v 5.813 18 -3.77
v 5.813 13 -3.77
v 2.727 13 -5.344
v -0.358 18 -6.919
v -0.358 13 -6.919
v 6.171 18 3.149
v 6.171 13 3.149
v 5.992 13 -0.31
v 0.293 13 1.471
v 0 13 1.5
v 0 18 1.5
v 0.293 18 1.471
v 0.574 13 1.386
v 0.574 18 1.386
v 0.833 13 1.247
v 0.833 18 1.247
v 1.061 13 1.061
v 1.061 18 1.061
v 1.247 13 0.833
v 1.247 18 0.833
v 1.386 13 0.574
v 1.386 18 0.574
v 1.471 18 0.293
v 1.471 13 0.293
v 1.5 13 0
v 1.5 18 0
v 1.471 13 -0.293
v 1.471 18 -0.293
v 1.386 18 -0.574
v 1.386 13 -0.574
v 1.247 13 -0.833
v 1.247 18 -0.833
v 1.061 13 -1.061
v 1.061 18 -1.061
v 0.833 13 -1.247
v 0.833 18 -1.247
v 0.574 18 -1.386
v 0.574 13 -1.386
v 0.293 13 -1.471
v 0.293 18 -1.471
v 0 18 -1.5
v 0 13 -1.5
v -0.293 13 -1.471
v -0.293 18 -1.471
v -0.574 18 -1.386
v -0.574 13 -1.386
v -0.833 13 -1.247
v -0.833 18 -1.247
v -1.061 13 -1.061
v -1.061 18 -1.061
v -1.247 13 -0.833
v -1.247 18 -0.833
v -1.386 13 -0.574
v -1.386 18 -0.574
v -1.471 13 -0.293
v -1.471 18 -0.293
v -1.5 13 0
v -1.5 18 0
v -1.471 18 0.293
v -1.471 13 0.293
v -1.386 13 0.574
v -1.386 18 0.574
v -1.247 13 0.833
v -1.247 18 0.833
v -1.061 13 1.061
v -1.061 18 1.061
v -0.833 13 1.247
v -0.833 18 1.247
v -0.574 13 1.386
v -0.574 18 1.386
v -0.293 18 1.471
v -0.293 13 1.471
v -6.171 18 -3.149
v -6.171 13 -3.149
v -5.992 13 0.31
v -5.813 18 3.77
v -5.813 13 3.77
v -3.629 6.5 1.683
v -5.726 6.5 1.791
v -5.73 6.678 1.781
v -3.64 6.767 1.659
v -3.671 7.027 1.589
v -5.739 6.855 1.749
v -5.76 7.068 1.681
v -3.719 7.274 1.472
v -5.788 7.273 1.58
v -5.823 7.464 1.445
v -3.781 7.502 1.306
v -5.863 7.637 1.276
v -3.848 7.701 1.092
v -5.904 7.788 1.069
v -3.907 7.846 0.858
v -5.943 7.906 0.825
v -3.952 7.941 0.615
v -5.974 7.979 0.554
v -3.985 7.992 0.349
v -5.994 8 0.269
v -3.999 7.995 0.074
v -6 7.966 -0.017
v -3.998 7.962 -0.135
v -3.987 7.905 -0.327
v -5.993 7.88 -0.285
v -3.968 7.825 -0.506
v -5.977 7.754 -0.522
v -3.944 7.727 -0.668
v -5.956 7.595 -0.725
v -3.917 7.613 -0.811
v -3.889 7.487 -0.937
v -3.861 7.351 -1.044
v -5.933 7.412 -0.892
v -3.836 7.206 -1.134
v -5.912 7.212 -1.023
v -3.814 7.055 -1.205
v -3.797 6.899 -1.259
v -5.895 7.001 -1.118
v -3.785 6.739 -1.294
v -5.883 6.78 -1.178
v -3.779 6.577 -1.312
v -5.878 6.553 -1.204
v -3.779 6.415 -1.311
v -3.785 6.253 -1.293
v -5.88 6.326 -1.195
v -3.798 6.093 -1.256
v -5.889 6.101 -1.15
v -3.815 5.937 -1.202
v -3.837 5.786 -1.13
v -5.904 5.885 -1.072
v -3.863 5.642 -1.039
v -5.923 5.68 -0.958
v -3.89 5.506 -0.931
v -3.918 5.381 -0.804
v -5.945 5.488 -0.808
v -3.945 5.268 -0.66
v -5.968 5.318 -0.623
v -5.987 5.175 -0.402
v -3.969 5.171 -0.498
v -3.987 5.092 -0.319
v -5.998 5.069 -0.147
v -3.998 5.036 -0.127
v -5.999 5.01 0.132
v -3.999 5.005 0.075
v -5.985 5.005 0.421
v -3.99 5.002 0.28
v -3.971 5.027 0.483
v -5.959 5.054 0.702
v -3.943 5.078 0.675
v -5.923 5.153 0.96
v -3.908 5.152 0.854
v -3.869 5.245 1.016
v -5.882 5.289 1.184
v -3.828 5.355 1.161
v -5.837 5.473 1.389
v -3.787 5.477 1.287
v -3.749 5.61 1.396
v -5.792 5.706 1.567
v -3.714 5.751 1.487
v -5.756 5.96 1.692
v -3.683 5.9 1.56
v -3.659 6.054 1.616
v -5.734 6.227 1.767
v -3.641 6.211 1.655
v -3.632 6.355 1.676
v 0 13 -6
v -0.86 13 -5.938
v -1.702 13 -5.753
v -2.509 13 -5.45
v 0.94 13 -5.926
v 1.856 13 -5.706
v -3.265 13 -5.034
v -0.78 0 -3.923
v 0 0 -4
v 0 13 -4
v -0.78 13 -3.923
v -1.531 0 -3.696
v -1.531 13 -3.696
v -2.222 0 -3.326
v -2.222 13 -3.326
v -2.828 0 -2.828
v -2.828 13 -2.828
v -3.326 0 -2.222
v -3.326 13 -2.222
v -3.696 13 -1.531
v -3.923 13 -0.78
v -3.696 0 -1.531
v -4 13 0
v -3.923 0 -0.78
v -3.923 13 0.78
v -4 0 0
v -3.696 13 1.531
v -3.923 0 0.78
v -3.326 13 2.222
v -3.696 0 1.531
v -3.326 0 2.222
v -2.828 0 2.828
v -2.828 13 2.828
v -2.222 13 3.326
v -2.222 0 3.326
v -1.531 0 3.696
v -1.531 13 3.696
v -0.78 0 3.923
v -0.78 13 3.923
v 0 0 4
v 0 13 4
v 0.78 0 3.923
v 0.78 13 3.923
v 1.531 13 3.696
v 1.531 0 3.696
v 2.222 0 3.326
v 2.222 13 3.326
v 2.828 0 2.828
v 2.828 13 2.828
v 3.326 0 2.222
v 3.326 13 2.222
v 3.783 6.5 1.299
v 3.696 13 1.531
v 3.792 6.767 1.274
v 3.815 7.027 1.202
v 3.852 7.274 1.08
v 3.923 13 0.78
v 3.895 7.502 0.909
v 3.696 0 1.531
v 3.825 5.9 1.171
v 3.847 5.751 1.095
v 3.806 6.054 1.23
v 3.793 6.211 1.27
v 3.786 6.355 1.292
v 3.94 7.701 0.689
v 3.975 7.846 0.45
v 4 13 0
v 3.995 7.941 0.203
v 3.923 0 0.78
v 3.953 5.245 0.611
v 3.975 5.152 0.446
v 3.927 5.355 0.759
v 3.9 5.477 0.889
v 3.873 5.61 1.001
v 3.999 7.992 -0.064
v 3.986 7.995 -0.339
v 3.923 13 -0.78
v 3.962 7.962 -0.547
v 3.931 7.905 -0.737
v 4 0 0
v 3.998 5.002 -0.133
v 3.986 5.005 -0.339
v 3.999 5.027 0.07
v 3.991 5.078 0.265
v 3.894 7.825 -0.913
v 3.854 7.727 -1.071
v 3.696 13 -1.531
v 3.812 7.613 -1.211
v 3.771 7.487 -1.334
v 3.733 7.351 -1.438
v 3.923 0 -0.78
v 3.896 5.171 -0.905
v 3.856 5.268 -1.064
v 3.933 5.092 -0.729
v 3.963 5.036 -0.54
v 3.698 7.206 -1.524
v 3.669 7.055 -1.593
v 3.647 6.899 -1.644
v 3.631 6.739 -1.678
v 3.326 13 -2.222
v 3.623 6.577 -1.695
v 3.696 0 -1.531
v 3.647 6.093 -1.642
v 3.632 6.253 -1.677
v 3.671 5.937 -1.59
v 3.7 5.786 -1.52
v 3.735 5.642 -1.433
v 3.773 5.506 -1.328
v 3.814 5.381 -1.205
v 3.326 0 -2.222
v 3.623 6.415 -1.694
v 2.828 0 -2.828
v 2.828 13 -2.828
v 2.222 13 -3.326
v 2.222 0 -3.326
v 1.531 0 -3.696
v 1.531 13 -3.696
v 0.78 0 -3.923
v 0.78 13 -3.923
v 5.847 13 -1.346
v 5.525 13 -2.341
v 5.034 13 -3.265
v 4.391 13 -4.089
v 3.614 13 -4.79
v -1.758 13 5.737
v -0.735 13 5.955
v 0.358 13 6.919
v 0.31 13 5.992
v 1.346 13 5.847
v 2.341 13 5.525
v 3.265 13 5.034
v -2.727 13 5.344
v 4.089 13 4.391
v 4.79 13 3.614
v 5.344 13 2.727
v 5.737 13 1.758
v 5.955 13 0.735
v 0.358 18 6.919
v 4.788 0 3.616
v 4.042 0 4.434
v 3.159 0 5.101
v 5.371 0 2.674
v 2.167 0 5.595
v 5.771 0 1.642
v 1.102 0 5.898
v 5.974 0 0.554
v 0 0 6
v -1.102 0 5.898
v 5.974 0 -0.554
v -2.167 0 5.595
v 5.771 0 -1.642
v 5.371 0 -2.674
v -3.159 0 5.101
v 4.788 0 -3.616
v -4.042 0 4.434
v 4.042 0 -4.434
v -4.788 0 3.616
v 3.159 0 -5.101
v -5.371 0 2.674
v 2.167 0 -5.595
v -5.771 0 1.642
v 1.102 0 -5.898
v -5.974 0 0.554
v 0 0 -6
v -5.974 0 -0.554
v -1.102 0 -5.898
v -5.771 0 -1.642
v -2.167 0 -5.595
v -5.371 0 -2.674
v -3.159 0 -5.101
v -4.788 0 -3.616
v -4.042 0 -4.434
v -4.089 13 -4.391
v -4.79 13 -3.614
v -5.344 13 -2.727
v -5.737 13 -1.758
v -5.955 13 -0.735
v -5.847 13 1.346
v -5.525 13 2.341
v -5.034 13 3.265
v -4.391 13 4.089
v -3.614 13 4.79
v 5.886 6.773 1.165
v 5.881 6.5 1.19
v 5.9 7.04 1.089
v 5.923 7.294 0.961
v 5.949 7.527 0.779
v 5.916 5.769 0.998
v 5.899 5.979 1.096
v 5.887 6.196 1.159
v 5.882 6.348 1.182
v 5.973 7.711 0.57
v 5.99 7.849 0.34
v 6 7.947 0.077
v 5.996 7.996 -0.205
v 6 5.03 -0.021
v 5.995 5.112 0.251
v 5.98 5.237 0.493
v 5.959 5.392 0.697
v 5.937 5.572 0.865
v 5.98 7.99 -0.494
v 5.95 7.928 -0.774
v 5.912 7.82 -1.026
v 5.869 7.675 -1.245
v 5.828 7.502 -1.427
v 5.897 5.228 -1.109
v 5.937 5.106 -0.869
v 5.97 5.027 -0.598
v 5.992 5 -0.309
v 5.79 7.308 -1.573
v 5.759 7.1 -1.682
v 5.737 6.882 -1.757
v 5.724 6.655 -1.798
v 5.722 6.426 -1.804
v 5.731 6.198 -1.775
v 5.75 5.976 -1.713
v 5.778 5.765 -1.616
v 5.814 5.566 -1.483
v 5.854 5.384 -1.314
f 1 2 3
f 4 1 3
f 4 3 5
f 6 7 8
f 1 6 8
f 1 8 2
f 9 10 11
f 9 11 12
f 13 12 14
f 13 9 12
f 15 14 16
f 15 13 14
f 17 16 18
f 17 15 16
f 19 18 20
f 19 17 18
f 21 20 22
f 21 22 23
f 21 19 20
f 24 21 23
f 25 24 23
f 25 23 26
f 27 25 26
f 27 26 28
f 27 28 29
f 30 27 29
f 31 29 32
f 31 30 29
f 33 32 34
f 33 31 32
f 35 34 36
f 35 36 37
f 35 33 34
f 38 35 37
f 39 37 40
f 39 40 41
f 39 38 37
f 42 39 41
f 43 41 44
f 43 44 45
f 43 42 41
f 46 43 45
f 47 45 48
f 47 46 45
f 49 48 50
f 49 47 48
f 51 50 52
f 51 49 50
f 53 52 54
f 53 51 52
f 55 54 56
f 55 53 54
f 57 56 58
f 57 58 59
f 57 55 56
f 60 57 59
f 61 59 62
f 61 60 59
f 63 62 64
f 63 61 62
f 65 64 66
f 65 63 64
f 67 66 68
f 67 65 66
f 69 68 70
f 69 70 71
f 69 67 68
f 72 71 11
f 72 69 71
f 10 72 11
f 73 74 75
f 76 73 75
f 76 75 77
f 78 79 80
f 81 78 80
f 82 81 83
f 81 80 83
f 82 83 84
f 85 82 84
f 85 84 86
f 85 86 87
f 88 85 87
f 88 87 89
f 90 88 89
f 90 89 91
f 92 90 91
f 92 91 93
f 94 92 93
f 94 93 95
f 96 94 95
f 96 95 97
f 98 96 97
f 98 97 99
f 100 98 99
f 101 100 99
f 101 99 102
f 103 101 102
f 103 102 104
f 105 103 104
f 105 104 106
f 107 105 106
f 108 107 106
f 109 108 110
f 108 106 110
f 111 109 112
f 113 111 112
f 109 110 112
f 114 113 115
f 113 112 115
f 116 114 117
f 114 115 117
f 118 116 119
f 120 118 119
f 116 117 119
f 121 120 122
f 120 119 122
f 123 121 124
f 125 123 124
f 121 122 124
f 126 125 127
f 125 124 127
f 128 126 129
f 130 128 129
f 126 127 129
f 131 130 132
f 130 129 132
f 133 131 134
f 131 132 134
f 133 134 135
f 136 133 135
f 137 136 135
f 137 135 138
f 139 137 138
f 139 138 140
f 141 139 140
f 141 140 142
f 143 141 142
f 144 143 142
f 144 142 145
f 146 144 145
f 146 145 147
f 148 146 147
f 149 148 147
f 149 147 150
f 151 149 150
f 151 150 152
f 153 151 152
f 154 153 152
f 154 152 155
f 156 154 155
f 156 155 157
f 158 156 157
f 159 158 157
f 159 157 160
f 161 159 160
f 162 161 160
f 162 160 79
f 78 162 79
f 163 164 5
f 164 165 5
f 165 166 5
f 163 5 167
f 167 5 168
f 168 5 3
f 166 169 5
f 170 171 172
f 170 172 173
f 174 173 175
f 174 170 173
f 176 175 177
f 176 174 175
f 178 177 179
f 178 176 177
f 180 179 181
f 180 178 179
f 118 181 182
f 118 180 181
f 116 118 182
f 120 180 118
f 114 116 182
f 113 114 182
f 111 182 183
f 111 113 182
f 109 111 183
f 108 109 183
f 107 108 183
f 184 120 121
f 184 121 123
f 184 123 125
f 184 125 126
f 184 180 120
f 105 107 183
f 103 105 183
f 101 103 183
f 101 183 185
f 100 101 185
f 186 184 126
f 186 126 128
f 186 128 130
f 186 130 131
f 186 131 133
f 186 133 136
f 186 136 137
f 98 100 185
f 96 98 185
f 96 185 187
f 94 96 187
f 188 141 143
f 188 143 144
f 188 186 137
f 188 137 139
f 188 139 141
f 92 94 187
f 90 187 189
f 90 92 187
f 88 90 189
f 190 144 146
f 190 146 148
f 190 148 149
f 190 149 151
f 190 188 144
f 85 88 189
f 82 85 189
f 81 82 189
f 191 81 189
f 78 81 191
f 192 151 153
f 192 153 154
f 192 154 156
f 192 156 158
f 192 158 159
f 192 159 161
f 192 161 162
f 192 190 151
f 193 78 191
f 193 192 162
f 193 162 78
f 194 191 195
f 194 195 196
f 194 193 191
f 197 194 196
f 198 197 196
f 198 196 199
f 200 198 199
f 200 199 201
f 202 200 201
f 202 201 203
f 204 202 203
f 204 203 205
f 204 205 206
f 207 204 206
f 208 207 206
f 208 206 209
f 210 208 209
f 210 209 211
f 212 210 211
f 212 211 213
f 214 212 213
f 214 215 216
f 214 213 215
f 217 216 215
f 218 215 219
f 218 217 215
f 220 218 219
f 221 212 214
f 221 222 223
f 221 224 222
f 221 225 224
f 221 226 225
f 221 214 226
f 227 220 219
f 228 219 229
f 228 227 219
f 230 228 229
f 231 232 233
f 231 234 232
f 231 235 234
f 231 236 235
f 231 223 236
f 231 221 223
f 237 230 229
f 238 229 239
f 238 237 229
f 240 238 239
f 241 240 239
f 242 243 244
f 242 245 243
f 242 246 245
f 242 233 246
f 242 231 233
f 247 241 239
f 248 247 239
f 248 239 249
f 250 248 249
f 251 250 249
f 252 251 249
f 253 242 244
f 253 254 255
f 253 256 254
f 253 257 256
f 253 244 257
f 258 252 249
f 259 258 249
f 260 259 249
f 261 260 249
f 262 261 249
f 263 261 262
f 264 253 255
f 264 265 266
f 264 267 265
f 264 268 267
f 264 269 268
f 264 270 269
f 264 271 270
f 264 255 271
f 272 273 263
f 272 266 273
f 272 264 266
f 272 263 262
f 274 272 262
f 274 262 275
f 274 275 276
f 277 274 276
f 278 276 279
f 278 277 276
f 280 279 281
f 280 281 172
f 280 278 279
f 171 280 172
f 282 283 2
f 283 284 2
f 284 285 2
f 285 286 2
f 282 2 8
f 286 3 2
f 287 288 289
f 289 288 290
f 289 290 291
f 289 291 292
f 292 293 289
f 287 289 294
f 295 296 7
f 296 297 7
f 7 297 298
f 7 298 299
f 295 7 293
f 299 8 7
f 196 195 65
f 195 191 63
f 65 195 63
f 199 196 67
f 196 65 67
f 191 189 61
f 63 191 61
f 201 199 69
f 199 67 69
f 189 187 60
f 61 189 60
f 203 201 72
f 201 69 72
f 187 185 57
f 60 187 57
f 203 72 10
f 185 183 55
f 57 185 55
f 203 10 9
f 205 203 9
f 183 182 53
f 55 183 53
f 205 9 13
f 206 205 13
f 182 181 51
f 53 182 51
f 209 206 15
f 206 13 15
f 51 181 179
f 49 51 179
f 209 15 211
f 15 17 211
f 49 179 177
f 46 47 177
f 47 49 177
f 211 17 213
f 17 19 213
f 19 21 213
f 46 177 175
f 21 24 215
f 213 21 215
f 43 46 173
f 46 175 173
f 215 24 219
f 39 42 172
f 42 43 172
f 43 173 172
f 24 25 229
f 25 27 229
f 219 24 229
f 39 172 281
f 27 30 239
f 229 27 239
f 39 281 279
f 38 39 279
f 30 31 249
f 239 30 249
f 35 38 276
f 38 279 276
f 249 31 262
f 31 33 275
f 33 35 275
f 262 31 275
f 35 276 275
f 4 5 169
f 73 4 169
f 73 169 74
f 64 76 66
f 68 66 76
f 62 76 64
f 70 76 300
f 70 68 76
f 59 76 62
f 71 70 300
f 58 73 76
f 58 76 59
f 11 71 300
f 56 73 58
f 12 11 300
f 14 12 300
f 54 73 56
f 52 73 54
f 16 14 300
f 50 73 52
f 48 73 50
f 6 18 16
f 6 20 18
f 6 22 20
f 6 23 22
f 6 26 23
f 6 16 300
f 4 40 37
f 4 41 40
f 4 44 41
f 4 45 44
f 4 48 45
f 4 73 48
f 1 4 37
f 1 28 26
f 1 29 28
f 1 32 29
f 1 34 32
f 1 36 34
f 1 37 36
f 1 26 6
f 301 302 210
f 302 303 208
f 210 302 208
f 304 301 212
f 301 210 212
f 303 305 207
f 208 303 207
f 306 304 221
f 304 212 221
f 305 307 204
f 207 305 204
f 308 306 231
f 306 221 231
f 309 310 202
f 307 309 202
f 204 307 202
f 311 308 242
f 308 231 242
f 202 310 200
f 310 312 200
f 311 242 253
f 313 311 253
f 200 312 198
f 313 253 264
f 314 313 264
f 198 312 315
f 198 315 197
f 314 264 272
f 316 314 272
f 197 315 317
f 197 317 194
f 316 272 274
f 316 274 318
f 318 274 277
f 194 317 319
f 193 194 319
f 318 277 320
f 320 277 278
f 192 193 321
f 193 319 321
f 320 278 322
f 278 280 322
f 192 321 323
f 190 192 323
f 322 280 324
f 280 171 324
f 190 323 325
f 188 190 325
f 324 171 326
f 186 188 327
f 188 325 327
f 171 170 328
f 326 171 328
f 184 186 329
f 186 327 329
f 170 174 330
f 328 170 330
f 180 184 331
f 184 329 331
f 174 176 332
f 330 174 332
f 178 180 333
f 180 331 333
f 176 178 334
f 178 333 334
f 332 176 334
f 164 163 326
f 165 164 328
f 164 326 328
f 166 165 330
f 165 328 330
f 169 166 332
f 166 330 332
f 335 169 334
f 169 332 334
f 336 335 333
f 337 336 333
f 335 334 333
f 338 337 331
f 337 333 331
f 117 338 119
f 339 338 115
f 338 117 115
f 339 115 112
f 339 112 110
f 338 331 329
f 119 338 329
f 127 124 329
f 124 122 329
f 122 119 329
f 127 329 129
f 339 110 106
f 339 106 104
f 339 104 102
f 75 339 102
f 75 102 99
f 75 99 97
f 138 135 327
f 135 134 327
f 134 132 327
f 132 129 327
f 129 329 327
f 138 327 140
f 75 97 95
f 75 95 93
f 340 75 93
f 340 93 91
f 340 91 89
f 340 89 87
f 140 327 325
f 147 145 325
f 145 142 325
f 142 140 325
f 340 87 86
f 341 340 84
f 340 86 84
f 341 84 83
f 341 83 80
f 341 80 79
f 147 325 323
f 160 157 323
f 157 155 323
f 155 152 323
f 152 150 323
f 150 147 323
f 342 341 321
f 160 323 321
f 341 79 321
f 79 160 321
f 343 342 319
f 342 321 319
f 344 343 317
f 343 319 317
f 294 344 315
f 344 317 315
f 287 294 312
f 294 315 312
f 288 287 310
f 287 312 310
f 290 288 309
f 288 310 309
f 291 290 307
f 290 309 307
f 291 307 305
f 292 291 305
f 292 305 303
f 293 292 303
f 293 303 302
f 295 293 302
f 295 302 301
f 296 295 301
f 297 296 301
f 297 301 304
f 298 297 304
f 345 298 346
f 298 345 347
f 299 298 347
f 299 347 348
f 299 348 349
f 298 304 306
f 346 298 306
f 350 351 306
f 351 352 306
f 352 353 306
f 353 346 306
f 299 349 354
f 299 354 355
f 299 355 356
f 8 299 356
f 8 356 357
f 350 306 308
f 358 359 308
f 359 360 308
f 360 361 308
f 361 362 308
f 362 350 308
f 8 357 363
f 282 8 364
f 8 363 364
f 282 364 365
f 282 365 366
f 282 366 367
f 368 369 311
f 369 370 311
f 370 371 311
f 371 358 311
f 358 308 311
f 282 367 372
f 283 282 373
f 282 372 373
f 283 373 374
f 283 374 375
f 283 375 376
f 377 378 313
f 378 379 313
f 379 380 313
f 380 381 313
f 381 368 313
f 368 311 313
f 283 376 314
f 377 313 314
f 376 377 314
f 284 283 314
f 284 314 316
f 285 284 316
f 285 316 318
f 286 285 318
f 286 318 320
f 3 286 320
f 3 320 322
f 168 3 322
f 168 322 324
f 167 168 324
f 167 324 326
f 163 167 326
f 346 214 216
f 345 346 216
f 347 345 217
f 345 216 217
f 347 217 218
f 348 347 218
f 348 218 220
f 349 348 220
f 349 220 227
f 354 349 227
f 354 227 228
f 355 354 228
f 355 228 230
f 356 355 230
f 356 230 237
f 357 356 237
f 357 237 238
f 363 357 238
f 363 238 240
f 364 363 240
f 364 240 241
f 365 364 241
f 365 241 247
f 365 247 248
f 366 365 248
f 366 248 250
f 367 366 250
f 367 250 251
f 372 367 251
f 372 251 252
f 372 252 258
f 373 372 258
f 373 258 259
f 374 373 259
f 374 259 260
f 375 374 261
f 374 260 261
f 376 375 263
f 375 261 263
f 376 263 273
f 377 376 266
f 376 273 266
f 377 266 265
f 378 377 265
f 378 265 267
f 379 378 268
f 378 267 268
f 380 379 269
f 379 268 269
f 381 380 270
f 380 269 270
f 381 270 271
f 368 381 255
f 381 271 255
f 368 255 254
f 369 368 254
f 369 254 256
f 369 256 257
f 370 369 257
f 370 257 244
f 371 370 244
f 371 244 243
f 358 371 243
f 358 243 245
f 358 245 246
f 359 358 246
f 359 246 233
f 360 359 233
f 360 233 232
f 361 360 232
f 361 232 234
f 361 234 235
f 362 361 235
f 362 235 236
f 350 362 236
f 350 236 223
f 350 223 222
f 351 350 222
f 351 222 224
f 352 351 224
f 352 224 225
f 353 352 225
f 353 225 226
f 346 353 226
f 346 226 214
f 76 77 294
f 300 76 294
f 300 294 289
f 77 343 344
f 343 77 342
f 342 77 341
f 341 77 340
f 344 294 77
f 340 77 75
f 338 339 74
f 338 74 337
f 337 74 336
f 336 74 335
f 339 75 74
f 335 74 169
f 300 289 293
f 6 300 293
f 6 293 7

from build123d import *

# Parameters (mm, degrees)
CROQUIS1_R              = 6
CROQUIS1_R_2            = 4
SALIENTE_EXTRUIR1_DEPTH = 13
CROQUIS2_R              = 1.5
SALIENTE_EXTRUIR2_DEPTH = 5
CROQUIS3_R              = 1.5
CORTAR_EXTRUIR1_DEPTH   = 24


with BuildPart() as part:
    # Croquis1 → Saliente-Extruir1 (new body)
    with BuildSketch(Plane(origin=(0, 0, 0), x_dir=(1, 0, 0), z_dir=(0, 1, 0))):
        with Locations(Location((0, 0, 0), (0, 0, 90))):
            Circle(CROQUIS1_R)
        with Locations(Location((0, 0, 0), (0, 0, 90))):
            Circle(CROQUIS1_R_2, mode=Mode.SUBTRACT)
    extrude(amount=SALIENTE_EXTRUIR1_DEPTH)

    # Croquis2 → Saliente-Extruir2 (add)
    with BuildSketch(Plane(origin=(0, 13, 0), x_dir=(1, 0, 0), z_dir=(0, 1, 0))):
        Polygon((6.17109675, -3.149216553), (5.812849912, 3.769718279), (-0.358246838, 6.918934832), (-6.17109675, 3.149216553), (-5.812849912, -3.769718279), (0.358246838, -6.918934832), align=None)
        with Locations(Location((0, 0, 0), (0, 0, 270))):
            Circle(CROQUIS2_R, mode=Mode.SUBTRACT)
    extrude(amount=SALIENTE_EXTRUIR2_DEPTH)

    # Croquis3 → Cortar-Extruir1 (cut)
    with BuildSketch(Plane(origin=(-5.991973331, 0, 0.310250863), x_dir=(0.0517084771330075, 0, 0.9986622218711316), z_dir=(-0.9986622218711316, 0, 0.0517084771330075))):
        with Locations((-0.007268939, 6.5)):
            Circle(CROQUIS3_R)
    extrude(amount=-CORTAR_EXTRUIR1_DEPTH, mode=Mode.SUBTRACT)


solid = part.part
